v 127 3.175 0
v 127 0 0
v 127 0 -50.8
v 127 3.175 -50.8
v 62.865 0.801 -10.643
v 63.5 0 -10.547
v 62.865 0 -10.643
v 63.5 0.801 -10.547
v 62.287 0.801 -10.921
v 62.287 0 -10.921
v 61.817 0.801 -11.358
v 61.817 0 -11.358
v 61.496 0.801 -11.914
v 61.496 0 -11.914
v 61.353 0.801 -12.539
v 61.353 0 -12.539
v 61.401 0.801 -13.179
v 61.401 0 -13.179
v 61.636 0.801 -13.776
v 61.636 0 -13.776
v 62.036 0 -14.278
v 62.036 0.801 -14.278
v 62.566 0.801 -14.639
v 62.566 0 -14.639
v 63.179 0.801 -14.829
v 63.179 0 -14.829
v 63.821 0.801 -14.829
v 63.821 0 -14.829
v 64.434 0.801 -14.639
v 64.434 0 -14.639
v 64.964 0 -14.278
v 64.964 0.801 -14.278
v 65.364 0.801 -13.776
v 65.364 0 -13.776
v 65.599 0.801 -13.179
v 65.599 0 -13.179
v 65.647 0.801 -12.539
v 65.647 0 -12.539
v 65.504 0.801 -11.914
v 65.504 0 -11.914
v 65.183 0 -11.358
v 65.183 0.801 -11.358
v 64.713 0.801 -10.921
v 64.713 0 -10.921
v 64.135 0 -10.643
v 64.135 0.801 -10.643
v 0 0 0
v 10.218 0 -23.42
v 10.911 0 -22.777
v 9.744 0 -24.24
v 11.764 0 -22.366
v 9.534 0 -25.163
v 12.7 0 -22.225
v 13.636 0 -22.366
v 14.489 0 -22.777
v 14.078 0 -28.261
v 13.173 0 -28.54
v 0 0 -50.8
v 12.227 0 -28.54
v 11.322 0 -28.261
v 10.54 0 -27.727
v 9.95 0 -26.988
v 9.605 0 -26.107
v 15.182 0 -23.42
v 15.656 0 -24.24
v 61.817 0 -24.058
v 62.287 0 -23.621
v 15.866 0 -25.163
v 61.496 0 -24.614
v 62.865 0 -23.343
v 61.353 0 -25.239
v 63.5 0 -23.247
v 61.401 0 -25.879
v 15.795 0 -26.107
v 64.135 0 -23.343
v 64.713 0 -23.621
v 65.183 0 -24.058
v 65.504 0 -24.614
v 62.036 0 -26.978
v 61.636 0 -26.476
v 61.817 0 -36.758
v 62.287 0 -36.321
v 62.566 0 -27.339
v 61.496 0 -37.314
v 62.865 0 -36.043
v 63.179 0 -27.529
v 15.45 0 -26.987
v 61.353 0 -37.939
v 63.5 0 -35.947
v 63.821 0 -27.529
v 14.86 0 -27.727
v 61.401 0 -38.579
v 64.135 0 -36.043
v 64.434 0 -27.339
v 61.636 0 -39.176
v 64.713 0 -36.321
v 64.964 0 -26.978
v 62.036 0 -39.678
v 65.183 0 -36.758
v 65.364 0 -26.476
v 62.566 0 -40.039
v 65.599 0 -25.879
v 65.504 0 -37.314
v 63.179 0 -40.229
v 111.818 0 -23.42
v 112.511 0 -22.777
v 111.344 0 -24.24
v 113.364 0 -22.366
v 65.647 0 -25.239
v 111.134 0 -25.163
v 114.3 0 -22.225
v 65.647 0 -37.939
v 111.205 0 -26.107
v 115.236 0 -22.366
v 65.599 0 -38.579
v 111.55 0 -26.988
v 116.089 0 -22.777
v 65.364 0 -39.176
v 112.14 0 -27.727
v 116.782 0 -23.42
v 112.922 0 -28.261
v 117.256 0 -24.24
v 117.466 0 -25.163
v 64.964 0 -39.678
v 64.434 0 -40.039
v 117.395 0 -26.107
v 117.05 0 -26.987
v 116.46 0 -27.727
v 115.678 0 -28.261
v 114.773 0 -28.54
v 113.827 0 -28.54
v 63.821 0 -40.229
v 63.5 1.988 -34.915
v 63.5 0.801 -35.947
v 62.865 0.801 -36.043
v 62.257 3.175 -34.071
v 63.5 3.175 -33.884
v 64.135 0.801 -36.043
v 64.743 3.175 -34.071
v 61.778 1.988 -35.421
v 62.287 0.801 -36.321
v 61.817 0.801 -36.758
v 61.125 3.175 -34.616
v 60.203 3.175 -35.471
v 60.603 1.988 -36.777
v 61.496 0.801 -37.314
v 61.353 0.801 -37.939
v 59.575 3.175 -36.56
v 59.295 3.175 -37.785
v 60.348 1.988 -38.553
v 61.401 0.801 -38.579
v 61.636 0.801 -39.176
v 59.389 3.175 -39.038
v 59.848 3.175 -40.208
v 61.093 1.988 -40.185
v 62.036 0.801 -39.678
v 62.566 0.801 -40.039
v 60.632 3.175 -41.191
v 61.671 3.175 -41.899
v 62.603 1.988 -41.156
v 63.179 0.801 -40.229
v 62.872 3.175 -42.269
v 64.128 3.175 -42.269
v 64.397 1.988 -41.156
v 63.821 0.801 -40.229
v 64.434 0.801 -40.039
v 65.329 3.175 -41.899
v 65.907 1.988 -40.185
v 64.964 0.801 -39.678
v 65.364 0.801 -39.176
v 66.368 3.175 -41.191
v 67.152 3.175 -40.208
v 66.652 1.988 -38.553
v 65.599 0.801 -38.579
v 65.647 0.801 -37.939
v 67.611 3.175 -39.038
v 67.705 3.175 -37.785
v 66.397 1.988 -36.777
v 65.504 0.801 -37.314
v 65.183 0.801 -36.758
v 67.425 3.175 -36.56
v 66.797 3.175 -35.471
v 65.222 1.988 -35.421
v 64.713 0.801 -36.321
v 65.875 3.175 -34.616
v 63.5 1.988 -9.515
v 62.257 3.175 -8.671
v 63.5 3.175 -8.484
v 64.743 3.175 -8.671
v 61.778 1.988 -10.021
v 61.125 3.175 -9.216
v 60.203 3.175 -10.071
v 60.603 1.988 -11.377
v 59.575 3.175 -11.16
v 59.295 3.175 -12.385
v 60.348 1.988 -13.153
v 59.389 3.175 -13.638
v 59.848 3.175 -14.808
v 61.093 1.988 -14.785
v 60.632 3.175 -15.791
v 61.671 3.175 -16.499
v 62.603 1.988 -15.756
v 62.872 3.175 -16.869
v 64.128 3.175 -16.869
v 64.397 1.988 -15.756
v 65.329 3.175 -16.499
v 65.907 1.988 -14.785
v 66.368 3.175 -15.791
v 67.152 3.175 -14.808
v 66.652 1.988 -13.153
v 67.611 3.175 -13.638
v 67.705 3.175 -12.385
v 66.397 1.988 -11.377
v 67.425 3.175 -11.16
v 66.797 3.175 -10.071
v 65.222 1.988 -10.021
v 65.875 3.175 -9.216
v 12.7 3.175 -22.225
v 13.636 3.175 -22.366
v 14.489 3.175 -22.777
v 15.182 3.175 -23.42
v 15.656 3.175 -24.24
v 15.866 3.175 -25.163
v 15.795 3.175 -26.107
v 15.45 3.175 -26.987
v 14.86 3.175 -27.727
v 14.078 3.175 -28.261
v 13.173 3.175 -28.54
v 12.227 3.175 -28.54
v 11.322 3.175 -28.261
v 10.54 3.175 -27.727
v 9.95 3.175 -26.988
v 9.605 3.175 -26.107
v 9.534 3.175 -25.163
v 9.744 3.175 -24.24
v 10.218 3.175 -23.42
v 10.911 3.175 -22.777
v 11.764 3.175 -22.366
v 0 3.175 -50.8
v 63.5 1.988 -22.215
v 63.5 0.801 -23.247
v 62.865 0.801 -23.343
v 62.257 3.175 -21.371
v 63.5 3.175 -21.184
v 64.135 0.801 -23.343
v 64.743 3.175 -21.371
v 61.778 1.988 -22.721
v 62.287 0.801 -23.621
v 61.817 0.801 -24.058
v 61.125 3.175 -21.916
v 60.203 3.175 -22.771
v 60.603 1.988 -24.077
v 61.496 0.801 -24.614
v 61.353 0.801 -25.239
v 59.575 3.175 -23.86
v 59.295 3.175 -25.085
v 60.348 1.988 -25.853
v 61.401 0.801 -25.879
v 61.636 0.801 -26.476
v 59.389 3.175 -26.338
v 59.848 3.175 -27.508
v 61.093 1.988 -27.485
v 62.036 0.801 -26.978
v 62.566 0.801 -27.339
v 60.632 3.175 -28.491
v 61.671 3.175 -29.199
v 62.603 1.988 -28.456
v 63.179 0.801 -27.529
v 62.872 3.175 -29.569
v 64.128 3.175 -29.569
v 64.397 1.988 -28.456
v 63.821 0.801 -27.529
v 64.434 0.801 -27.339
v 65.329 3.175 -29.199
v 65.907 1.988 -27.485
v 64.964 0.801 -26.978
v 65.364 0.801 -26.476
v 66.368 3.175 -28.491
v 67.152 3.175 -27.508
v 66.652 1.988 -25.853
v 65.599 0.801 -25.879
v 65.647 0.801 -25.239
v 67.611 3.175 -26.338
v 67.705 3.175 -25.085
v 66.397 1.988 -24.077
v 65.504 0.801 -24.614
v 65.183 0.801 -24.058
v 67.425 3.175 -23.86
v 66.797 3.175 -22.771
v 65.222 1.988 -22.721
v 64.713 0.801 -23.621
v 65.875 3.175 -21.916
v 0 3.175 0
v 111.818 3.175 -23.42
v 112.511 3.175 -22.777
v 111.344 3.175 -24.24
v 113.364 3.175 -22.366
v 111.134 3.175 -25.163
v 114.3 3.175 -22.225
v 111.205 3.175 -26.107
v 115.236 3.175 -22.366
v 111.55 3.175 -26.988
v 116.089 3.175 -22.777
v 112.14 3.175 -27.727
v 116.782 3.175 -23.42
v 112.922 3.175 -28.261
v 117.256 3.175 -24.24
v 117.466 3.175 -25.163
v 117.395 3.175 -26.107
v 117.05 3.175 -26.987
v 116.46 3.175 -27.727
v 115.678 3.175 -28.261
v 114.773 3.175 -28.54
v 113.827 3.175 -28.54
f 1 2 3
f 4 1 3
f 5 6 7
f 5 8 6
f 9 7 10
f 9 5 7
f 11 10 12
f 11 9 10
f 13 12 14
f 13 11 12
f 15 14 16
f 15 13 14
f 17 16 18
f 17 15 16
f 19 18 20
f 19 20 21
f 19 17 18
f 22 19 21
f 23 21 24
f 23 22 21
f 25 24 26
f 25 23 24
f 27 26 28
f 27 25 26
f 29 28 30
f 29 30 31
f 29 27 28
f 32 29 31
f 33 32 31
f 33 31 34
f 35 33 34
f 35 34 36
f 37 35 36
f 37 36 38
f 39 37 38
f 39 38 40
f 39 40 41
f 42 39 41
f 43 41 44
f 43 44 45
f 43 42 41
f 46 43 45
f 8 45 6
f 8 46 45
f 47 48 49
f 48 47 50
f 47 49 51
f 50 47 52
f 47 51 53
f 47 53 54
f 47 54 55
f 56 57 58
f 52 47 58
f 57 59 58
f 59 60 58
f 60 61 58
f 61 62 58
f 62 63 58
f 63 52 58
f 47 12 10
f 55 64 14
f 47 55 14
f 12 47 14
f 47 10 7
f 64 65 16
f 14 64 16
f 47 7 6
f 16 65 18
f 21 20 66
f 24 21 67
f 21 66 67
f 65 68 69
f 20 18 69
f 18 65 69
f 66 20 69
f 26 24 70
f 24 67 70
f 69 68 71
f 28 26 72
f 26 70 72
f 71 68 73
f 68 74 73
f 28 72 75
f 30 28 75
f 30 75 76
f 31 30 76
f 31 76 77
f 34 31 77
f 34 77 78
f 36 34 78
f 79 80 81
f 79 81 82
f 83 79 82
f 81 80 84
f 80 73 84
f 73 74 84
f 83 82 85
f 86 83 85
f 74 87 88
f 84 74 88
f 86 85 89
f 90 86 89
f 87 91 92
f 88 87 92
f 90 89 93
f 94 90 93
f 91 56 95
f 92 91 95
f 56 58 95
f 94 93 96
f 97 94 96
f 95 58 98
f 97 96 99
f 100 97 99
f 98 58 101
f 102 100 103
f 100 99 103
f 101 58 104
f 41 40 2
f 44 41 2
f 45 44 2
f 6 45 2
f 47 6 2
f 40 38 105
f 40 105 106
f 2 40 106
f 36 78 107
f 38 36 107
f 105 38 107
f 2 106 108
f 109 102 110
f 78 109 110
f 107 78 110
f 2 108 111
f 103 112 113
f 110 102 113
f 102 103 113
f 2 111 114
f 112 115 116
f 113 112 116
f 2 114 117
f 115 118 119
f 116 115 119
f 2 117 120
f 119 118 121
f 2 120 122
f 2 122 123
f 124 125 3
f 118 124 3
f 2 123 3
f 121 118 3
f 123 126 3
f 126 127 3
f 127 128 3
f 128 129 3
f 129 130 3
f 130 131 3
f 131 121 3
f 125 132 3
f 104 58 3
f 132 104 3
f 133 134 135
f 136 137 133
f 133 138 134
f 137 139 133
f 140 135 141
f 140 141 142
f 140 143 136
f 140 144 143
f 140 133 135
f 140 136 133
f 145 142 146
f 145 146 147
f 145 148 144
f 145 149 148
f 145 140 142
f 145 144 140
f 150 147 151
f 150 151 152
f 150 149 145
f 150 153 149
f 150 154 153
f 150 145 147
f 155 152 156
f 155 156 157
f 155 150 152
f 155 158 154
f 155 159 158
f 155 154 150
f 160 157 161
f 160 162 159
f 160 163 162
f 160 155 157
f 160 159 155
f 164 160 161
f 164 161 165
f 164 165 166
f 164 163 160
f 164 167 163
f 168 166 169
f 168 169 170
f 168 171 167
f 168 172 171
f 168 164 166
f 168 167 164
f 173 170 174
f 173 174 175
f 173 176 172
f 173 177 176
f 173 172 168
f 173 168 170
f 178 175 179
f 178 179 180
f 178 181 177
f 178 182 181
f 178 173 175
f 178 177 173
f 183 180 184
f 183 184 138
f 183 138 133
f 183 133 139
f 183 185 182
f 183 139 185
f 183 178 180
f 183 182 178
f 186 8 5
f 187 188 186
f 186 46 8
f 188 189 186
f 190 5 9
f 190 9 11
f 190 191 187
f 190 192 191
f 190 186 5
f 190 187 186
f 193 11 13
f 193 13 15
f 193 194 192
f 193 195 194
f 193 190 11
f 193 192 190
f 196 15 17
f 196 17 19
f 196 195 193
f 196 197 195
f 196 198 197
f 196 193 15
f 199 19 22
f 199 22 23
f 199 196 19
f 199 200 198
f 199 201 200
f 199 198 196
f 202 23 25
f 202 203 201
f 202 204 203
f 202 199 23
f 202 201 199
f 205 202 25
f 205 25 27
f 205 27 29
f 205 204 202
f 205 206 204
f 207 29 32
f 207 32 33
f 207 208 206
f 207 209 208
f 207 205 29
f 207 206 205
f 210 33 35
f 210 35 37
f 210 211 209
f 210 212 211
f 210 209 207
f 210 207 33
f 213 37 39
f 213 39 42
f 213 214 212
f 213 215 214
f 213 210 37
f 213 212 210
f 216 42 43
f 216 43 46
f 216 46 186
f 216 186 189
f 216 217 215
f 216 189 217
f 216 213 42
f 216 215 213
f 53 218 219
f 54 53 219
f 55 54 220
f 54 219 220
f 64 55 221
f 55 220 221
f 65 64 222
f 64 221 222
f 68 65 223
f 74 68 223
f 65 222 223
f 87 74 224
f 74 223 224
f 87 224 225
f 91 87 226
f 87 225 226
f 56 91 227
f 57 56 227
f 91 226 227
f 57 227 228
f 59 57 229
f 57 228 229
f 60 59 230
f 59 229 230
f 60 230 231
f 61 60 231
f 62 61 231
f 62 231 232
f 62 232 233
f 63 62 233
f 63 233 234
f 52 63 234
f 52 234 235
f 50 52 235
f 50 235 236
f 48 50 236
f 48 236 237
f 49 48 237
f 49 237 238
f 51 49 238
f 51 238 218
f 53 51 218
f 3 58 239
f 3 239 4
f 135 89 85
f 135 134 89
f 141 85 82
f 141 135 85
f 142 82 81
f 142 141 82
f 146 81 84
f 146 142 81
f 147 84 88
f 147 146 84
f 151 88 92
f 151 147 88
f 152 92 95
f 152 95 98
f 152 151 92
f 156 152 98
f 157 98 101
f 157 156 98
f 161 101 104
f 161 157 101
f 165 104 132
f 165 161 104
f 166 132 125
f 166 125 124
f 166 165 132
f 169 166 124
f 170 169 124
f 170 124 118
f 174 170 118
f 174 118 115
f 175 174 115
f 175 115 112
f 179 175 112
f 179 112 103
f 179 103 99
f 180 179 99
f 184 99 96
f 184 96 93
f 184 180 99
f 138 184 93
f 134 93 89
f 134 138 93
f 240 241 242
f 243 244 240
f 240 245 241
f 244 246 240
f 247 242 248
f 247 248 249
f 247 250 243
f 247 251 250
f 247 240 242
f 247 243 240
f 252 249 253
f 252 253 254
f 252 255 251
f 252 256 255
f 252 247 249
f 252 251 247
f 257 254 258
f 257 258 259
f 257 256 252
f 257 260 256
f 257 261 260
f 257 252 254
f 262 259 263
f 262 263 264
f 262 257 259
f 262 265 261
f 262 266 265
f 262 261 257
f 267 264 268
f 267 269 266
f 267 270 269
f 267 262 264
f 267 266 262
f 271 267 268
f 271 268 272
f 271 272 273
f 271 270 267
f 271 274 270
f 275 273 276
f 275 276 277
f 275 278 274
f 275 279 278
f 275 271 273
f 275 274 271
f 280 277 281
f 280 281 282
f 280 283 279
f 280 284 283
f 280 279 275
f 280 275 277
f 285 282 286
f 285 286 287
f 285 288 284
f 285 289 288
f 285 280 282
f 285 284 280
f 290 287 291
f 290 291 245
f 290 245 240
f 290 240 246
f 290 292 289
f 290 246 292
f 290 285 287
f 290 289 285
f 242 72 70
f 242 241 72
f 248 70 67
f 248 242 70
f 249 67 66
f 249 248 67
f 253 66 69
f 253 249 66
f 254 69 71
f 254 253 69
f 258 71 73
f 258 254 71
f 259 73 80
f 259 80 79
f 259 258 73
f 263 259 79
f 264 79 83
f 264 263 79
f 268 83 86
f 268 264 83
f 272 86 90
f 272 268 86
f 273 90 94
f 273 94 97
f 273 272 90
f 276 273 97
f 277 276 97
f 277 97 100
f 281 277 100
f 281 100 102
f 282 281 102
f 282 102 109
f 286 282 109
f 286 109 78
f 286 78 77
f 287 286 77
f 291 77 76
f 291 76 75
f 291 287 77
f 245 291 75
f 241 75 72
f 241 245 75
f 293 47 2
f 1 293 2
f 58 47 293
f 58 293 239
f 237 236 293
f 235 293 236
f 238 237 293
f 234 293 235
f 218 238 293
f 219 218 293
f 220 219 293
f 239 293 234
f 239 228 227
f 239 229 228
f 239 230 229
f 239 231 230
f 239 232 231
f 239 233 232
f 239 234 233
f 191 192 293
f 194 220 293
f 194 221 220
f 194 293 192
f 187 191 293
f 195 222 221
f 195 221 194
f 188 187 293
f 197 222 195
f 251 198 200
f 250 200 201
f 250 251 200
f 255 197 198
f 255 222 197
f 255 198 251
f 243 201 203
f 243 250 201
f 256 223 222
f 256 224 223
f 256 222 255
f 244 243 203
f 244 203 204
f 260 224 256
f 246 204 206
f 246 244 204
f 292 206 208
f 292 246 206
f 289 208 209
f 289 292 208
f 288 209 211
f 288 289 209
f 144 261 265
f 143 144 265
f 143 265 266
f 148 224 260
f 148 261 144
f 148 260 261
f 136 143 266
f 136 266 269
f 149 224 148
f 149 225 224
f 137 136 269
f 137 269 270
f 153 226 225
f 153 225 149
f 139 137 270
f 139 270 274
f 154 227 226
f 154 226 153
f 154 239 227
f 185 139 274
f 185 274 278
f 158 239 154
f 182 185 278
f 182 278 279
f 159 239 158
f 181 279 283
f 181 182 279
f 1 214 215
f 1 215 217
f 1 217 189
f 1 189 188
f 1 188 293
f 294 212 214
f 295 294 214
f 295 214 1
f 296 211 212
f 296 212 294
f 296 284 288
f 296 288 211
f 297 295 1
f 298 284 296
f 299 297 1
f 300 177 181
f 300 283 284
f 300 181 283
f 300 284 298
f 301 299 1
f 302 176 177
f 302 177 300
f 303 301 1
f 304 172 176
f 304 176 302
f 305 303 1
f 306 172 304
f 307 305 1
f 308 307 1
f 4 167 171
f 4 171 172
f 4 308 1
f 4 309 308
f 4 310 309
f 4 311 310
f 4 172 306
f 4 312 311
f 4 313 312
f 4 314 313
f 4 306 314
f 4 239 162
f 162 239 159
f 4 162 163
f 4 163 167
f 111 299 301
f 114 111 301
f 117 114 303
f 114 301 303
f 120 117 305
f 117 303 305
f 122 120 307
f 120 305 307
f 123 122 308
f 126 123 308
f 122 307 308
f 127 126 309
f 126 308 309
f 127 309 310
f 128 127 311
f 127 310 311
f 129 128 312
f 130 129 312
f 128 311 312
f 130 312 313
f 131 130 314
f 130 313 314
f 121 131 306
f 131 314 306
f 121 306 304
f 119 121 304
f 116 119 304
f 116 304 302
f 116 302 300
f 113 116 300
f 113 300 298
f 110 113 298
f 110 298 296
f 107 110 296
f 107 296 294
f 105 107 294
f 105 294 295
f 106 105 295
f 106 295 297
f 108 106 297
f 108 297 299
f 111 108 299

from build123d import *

# Parameters (mm, degrees)
SKETCH1_W                                     = 127
SKETCH1_H                                     = 50.8
BOSS_EXTRUDE1_DEPTH                           = 3.175
SKETCH2_R                                     = 3.175
CUT_EXTRUDE1_DEPTH                            = 6.35
CSK_FOR_8_FLAT_HEAD_MACHINE_SCREW1_AT_2_COUNT = 2
CSK_FOR_8_FLAT_HEAD_MACHINE_SCREW1_AT_2_PITCH = 12.7
CSK_FOR_8_FLAT_HEAD_MACHINE_SCREW1_AT_3_COUNT = 2
CSK_FOR_8_FLAT_HEAD_MACHINE_SCREW1_AT_3_PITCH = 25.4


with BuildPart() as part:
    # Sketch1 → Boss-Extrude1 (new body)
    with BuildSketch(Plane(origin=(0, 0, 0), x_dir=(1, 0, 0), z_dir=(0, 1, 0))):
        with Locations((63.5, 25.4)):
            Rectangle(SKETCH1_W, SKETCH1_H)
    extrude(amount=BOSS_EXTRUDE1_DEPTH)

    # Sketch2 → Cut-Extrude1 (cut)
    with BuildSketch(Plane(origin=(0, 3.175, 0), x_dir=(1, 0, 0), z_dir=(0, 1, 0))):
        with Locations(Location((12.7, 25.4, 0), (0, 0, 270))):
            Circle(SKETCH2_R)
        with Locations(Location((114.3, 25.4, 0), (0, 0, 270))):
            Circle(SKETCH2_R)
    extrude(amount=-CUT_EXTRUDE1_DEPTH, mode=Mode.SUBTRACT)

    # Sketch4 → CSK for #8 Flat Head Machine Screw1 (revolve, cut)
    with BuildSketch(Plane(origin=(63.5, 3.175, -12.7), x_dir=(0, 0, 1), z_dir=(1, 0, 0))):
        Polygon((0, 0), (0, 3.175), (2.15265, 3.175), (2.15265, 2.3740728), (4.2164, 0), align=None)
    csk_for_8_flat_head_machine_screw1 = revolve(axis=Axis((63.5, 9.525, -12.7), (0, -1, 0)), mode=Mode.SUBTRACT)

    # CSK for #8 Flat Head Machine Screw1 at 2: CSK for #8 Flat Head Machine Screw1 ×2
    with Locations(*[(0, 0, -i * CSK_FOR_8_FLAT_HEAD_MACHINE_SCREW1_AT_2_PITCH) for i in range(1, CSK_FOR_8_FLAT_HEAD_MACHINE_SCREW1_AT_2_COUNT)]):
        add(csk_for_8_flat_head_machine_screw1, mode=Mode.SUBTRACT)

    # CSK for #8 Flat Head Machine Screw1 at 3: CSK for #8 Flat Head Machine Screw1 ×2
    with Locations(*[(0, 0, -i * CSK_FOR_8_FLAT_HEAD_MACHINE_SCREW1_AT_3_PITCH) for i in range(1, CSK_FOR_8_FLAT_HEAD_MACHINE_SCREW1_AT_3_COUNT)]):
        add(csk_for_8_flat_head_machine_screw1, mode=Mode.SUBTRACT)


solid = part.part
